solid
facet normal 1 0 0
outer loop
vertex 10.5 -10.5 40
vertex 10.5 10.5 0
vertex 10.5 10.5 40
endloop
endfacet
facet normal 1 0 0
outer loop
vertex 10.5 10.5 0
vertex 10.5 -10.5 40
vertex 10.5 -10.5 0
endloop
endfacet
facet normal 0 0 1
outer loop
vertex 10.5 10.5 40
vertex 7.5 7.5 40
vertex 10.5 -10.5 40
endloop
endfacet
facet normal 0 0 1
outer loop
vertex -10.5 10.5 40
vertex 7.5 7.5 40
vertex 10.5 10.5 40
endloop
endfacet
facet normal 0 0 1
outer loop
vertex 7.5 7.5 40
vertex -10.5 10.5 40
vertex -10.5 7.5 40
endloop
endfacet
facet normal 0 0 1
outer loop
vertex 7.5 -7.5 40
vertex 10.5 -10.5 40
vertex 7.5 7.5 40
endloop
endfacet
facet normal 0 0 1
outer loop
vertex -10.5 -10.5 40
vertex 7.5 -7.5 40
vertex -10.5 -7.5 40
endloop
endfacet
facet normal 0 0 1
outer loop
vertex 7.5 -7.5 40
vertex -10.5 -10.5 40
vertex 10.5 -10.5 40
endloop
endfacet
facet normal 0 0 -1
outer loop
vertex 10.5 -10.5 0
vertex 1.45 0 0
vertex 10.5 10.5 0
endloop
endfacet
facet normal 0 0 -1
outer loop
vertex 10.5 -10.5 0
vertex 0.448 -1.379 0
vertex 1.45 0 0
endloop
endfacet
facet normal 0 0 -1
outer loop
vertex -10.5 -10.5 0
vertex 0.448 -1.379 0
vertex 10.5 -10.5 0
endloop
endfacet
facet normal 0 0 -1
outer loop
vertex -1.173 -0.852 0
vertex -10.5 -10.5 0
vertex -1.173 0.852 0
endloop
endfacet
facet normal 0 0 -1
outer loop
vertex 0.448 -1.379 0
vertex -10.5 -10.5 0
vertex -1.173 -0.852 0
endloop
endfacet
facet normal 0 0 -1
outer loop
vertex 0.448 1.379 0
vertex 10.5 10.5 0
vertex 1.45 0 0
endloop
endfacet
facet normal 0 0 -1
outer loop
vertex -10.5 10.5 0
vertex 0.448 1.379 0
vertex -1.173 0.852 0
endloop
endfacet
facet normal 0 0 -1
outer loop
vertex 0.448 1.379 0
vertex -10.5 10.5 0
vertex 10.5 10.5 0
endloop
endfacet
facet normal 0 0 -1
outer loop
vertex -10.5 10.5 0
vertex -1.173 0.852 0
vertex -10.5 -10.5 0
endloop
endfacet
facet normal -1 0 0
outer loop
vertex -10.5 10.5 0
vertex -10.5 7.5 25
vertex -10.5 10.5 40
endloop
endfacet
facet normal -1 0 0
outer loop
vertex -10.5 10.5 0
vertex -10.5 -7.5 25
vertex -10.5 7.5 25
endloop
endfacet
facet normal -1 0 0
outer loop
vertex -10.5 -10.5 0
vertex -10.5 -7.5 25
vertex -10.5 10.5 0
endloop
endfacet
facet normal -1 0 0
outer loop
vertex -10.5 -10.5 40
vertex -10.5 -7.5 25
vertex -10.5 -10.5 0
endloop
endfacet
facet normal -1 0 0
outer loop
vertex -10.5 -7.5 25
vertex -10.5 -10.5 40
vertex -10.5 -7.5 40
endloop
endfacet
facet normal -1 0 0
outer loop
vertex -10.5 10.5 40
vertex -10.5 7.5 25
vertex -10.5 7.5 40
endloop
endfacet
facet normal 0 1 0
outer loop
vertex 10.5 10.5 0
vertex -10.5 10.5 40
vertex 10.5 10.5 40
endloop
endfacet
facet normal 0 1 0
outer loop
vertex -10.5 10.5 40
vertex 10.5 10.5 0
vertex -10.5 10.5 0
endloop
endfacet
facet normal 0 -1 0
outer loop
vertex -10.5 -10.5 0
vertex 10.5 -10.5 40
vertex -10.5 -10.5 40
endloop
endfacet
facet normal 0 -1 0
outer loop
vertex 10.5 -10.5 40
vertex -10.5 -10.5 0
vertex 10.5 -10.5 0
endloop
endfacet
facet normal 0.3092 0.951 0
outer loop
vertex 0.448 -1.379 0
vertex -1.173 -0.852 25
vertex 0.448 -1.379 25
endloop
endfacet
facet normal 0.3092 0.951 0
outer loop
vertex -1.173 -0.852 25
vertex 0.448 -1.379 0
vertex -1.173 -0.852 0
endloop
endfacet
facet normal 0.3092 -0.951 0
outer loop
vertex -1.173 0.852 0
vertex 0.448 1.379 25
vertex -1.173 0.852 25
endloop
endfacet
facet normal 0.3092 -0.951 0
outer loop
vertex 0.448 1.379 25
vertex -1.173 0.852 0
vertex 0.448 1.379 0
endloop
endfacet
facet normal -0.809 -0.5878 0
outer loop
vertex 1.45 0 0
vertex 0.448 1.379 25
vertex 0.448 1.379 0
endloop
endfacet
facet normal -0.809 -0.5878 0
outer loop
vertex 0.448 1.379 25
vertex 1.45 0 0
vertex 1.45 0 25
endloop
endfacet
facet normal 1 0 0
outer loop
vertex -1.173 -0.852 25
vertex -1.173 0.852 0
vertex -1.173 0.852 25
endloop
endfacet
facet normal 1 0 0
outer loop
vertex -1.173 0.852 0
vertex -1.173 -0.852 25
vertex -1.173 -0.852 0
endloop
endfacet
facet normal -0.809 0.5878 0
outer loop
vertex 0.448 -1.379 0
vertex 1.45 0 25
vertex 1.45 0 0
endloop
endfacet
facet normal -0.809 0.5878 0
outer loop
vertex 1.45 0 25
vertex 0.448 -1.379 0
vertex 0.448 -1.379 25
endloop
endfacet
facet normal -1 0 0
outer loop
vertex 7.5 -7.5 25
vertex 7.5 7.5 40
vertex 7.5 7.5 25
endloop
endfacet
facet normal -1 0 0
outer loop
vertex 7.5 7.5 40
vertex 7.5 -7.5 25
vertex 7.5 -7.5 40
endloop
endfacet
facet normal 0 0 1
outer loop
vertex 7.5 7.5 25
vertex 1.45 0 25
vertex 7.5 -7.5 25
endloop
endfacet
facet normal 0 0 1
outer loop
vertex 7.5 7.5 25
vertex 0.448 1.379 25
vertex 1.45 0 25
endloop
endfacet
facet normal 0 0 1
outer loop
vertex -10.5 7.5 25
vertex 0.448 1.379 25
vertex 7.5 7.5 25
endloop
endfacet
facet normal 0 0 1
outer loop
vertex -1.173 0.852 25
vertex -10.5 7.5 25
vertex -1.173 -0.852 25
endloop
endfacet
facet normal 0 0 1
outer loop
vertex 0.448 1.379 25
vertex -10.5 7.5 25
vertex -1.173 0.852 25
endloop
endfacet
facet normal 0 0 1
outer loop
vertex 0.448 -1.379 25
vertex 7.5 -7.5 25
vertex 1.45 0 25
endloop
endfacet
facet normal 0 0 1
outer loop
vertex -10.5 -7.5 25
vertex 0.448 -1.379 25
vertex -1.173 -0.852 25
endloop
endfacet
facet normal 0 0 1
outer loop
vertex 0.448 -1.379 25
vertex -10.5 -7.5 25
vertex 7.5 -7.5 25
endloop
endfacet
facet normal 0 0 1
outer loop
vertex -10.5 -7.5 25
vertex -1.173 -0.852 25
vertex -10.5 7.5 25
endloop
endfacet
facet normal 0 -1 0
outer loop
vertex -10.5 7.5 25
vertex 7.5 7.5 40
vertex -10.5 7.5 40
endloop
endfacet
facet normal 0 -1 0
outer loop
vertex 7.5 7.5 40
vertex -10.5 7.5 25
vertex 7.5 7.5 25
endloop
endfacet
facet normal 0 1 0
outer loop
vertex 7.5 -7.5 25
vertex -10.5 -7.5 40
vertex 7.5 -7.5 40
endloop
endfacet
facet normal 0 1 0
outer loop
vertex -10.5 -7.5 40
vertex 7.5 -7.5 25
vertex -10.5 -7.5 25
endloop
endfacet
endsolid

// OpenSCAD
// file: parameter.scad
nStrings=6;
nFrets=24;
nLedFrets=16;
m5Dia=5.3;
m5HeadZ=3.5;
m4Dia=4.3;
m4NutDia=8.3;
m4NutZ=3.5;
m4HeadZ=2.5;
m3Dia=3.3;
m3NutDia=6.6;
m3NutZ=2.5;
m3HeadZ=2;
strDistN=7;
strDistB=10.25;
scale=645;
neckSlotY=500;

slotXY=15;

bodySlotX=115;
bodySlotY=250;

jackYA=40;
jackYB=54;
jackZA=20;
jackZB=25;

bodyX=300;

bodyZ=40;

strDia=[1.7,1.4,1.1,0.7,0.5,0.35];

fretStrPlus=4;
fretLN=strDistN*(nStrings-1)+fretStrPlus*2;
fretLB=strDistB*(nStrings-1)+fretStrPlus*2;
strSpanB=strDistB*(nStrings-1);
strSpanN=strDistN*(nStrings-1);
fretBtmZ=1;
neckSlotX=fretLN;
neckSlotDist=neckSlotX-slotXY*2;

neck_sideT=5.5; //thicknes of the neck side locks
neck_bottomT=2.5;

neck_mntPosYA=447;
neck_mntPosYB=420;
neck_mntEndT=2.5;
neck_lastFretSpc=13;

nut_slotSink=6;

//fretY=16;
fretPcbZ=1.6;
fretDia=3.5;
fretZ=1.5;
fretOvrZ=4;
fretboardZ=fretOvrZ+fretPcbZ;



L=scale;
k=1.05946;

fretPos1=scale-(scale/pow(k,4));

function fretPos(i)=L-(L/pow(k,i));
function fretSpc(i)=(L/pow(k,i))-(L/pow(k,i+1));
function strSpc(i)=i/L*strDistB+(1-i/L)*strDistN;
function fretL(i)=(i/L*strDistB+(1-i/L)*strDistN)*(nStrings-1)+fretStrPlus*2;

echo (70-(fretL(fretPos(1))));
// main file
include <parameter.scad>

wthick=3;
difference(){
    translate([0,0,bodyZ/2])cube([slotXY+wthick*2,slotXY+wthick*2,bodyZ],center=true);
    cylinder(d=2.9,h=bodyZ);
    translate([-slotXY/2,0,bodyZ-slotXY/2])cube([slotXY*2,slotXY,slotXY],center=true);
}
    
